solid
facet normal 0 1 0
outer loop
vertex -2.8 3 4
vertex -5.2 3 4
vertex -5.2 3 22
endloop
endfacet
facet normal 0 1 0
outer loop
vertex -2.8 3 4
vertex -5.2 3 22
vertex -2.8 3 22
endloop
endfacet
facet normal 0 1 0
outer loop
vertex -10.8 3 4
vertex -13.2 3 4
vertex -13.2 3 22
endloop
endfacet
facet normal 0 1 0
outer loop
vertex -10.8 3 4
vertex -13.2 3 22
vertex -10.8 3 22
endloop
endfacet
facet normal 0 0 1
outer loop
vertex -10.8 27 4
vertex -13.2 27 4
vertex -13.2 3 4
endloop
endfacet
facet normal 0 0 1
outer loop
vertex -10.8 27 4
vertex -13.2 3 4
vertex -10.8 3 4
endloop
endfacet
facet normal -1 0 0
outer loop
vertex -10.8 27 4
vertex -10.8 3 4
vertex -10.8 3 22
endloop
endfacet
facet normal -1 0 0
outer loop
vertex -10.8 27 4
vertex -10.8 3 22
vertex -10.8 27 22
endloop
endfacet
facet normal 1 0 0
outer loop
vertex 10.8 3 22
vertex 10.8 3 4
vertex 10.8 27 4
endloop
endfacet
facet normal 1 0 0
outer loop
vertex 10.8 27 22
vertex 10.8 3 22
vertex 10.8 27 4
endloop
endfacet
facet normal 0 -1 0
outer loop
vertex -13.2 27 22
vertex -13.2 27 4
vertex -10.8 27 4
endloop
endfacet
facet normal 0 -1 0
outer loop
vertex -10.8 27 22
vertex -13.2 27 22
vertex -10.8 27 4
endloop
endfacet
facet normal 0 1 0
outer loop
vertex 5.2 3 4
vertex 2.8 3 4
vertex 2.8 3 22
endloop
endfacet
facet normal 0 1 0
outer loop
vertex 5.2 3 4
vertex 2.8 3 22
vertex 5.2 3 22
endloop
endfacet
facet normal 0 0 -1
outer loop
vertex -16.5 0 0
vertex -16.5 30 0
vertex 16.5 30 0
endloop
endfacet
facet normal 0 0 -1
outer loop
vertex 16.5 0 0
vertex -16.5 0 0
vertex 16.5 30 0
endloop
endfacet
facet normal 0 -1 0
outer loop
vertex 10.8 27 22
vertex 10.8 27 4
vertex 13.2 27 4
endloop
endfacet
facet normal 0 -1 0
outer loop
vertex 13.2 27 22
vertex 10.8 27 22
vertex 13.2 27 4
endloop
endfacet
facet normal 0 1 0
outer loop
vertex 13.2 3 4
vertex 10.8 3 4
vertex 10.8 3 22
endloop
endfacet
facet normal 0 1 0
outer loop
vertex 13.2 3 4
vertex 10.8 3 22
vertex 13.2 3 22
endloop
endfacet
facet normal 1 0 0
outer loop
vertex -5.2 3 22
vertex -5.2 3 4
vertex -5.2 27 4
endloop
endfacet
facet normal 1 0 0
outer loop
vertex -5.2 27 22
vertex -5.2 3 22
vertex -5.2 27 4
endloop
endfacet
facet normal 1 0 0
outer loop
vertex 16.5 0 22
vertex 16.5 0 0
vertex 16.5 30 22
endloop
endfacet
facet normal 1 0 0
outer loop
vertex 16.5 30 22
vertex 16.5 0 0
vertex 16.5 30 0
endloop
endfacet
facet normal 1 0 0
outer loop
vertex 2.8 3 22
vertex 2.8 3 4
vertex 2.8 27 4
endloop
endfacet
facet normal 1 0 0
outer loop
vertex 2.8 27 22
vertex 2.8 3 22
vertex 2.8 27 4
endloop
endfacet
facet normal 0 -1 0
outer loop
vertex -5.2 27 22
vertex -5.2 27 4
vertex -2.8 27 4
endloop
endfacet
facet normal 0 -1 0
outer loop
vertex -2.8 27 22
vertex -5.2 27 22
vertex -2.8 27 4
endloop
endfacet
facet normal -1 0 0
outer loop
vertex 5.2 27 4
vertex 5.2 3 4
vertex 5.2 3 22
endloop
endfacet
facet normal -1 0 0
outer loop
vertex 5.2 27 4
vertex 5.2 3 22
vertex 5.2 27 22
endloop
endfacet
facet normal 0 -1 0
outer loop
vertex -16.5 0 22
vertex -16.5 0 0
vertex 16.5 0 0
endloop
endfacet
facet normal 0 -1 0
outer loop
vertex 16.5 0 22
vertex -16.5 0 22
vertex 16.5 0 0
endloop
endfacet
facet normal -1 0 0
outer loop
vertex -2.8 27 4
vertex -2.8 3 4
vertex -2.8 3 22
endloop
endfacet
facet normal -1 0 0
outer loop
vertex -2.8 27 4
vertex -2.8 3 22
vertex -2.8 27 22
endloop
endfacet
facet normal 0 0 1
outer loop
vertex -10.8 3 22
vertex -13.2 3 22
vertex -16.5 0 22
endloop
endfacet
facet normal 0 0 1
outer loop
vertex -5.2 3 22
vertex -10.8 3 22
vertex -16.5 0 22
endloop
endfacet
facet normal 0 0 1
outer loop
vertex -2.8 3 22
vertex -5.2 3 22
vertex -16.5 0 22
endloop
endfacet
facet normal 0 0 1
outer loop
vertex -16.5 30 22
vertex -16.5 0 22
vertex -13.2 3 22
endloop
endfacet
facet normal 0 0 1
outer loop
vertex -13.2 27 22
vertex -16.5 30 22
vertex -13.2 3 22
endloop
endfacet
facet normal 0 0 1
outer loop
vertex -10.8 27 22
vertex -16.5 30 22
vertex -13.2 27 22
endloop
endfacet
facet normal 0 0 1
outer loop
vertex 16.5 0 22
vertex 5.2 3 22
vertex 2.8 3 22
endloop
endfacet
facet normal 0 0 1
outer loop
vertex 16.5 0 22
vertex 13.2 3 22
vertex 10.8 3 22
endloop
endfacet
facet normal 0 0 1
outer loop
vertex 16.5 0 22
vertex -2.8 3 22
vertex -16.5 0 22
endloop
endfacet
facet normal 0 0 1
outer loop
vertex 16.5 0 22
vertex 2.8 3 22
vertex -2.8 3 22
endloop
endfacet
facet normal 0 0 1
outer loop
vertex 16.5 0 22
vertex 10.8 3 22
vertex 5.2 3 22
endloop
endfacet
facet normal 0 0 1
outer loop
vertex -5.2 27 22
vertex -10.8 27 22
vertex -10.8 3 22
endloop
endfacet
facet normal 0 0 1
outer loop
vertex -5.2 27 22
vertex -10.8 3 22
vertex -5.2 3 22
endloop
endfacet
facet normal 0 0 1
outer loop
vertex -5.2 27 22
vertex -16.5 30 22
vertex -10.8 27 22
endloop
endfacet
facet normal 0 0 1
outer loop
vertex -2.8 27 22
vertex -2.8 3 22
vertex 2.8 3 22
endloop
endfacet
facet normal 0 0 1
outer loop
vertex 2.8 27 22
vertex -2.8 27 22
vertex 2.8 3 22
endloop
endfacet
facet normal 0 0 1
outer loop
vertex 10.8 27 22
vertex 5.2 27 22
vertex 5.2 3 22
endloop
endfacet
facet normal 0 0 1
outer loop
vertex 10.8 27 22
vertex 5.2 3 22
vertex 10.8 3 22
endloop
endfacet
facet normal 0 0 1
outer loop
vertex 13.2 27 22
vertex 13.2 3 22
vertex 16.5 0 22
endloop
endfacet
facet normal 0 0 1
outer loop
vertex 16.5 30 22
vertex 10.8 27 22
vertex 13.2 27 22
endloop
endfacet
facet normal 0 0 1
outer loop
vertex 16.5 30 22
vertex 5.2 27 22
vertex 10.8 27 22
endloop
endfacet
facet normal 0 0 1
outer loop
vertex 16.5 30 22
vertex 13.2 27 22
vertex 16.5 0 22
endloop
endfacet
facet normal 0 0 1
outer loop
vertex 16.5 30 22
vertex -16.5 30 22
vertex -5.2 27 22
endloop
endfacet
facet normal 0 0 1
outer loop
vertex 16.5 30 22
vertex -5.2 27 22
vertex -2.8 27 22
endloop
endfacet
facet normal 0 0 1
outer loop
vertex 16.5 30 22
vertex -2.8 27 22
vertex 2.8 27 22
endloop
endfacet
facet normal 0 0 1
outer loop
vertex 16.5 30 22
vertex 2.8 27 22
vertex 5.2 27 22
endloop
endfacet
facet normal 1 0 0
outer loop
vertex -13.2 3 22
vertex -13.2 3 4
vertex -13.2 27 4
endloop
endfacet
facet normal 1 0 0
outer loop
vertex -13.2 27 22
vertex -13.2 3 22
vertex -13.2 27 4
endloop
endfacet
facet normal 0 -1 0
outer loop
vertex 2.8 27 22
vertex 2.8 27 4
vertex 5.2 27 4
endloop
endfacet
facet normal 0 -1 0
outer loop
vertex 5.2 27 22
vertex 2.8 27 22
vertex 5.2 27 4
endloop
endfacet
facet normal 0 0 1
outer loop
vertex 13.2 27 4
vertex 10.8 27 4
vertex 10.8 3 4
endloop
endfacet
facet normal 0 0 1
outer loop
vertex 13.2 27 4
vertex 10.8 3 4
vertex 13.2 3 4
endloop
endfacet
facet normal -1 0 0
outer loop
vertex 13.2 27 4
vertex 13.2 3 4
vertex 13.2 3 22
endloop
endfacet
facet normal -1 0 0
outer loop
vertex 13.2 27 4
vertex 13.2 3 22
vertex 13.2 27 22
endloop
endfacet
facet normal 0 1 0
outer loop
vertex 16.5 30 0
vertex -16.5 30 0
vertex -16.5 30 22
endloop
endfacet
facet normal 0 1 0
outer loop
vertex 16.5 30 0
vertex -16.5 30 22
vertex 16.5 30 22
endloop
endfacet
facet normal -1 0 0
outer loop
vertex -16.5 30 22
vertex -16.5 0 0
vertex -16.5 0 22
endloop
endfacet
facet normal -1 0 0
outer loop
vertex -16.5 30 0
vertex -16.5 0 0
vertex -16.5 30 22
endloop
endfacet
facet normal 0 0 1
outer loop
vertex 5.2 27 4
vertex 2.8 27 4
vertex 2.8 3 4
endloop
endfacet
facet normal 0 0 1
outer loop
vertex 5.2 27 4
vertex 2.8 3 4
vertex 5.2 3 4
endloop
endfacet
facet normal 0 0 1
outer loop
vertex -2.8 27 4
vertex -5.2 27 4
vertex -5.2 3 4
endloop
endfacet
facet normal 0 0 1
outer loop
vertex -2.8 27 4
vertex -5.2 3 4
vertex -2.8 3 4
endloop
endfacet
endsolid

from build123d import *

# Parameters (mm, degrees)
BOX002_W     = 2.4
BOX002_H     = 24
BOX002_DEPTH = 20
BOX003_W     = 2.4
BOX003_H     = 24
BOX003_DEPTH = 20
BOX004_W     = 2.4
BOX004_H     = 24
BOX004_DEPTH = 20
BOX001_W     = 2.4
BOX001_H     = 24
BOX001_DEPTH = 20
BOX_W        = 33
BOX_H        = 30
BOX_DEPTH    = 22


with BuildPart() as box002:
    # Box002 → Box002 (new body)
    with BuildSketch(Plane(origin=(8, -28, 0), x_dir=(1, 0, 0), z_dir=(0, 0, 1))):
        with Locations((1.2, 12)):
            Rectangle(BOX002_W, BOX002_H)
    extrude(amount=BOX002_DEPTH)


with BuildPart() as box003:
    # Box003 → Box003 (new body)
    with BuildSketch(Plane(origin=(16, -28, 0), x_dir=(1, 0, 0), z_dir=(0, 0, 1))):
        with Locations((1.2, 12)):
            Rectangle(BOX003_W, BOX003_H)
    extrude(amount=BOX003_DEPTH)


with BuildPart() as box004:
    # Box004 → Box004 (new body)
    with BuildSketch(Plane(origin=(24, -28, 0), x_dir=(1, 0, 0), z_dir=(0, 0, 1))):
        with Locations((1.2, 12)):
            Rectangle(BOX004_W, BOX004_H)
    extrude(amount=BOX004_DEPTH)


with BuildPart() as fusion:
    # Box001 → Box001 (new body)
    with BuildSketch(Plane(origin=(0, -28, 0), x_dir=(1, 0, 0), z_dir=(0, 0, 1))):
        with Locations((1.2, 12)):
            Rectangle(BOX001_W, BOX001_H)
    extrude(amount=BOX001_DEPTH)

    # Fusion: union Box002, Box003, Box004
    add(box002.part)
    add(box003.part)
    add(box004.part)


with BuildPart() as fusion_1:
    # Fusion placement: moved
    add(fusion.part.moved(Location((-13.2, 31, 4))))


with BuildPart() as cut:
    # Box → Box (new body)
    with BuildSketch(Plane(origin=(-16.5, 0, 0), x_dir=(1, 0, 0), z_dir=(0, 0, 1))):
        with Locations((16.5, 15)):
            Rectangle(BOX_W, BOX_H)
    extrude(amount=BOX_DEPTH)

    # Cut: cut Fusion
    add(fusion_1.part, mode=Mode.SUBTRACT)


solid = cut.part
